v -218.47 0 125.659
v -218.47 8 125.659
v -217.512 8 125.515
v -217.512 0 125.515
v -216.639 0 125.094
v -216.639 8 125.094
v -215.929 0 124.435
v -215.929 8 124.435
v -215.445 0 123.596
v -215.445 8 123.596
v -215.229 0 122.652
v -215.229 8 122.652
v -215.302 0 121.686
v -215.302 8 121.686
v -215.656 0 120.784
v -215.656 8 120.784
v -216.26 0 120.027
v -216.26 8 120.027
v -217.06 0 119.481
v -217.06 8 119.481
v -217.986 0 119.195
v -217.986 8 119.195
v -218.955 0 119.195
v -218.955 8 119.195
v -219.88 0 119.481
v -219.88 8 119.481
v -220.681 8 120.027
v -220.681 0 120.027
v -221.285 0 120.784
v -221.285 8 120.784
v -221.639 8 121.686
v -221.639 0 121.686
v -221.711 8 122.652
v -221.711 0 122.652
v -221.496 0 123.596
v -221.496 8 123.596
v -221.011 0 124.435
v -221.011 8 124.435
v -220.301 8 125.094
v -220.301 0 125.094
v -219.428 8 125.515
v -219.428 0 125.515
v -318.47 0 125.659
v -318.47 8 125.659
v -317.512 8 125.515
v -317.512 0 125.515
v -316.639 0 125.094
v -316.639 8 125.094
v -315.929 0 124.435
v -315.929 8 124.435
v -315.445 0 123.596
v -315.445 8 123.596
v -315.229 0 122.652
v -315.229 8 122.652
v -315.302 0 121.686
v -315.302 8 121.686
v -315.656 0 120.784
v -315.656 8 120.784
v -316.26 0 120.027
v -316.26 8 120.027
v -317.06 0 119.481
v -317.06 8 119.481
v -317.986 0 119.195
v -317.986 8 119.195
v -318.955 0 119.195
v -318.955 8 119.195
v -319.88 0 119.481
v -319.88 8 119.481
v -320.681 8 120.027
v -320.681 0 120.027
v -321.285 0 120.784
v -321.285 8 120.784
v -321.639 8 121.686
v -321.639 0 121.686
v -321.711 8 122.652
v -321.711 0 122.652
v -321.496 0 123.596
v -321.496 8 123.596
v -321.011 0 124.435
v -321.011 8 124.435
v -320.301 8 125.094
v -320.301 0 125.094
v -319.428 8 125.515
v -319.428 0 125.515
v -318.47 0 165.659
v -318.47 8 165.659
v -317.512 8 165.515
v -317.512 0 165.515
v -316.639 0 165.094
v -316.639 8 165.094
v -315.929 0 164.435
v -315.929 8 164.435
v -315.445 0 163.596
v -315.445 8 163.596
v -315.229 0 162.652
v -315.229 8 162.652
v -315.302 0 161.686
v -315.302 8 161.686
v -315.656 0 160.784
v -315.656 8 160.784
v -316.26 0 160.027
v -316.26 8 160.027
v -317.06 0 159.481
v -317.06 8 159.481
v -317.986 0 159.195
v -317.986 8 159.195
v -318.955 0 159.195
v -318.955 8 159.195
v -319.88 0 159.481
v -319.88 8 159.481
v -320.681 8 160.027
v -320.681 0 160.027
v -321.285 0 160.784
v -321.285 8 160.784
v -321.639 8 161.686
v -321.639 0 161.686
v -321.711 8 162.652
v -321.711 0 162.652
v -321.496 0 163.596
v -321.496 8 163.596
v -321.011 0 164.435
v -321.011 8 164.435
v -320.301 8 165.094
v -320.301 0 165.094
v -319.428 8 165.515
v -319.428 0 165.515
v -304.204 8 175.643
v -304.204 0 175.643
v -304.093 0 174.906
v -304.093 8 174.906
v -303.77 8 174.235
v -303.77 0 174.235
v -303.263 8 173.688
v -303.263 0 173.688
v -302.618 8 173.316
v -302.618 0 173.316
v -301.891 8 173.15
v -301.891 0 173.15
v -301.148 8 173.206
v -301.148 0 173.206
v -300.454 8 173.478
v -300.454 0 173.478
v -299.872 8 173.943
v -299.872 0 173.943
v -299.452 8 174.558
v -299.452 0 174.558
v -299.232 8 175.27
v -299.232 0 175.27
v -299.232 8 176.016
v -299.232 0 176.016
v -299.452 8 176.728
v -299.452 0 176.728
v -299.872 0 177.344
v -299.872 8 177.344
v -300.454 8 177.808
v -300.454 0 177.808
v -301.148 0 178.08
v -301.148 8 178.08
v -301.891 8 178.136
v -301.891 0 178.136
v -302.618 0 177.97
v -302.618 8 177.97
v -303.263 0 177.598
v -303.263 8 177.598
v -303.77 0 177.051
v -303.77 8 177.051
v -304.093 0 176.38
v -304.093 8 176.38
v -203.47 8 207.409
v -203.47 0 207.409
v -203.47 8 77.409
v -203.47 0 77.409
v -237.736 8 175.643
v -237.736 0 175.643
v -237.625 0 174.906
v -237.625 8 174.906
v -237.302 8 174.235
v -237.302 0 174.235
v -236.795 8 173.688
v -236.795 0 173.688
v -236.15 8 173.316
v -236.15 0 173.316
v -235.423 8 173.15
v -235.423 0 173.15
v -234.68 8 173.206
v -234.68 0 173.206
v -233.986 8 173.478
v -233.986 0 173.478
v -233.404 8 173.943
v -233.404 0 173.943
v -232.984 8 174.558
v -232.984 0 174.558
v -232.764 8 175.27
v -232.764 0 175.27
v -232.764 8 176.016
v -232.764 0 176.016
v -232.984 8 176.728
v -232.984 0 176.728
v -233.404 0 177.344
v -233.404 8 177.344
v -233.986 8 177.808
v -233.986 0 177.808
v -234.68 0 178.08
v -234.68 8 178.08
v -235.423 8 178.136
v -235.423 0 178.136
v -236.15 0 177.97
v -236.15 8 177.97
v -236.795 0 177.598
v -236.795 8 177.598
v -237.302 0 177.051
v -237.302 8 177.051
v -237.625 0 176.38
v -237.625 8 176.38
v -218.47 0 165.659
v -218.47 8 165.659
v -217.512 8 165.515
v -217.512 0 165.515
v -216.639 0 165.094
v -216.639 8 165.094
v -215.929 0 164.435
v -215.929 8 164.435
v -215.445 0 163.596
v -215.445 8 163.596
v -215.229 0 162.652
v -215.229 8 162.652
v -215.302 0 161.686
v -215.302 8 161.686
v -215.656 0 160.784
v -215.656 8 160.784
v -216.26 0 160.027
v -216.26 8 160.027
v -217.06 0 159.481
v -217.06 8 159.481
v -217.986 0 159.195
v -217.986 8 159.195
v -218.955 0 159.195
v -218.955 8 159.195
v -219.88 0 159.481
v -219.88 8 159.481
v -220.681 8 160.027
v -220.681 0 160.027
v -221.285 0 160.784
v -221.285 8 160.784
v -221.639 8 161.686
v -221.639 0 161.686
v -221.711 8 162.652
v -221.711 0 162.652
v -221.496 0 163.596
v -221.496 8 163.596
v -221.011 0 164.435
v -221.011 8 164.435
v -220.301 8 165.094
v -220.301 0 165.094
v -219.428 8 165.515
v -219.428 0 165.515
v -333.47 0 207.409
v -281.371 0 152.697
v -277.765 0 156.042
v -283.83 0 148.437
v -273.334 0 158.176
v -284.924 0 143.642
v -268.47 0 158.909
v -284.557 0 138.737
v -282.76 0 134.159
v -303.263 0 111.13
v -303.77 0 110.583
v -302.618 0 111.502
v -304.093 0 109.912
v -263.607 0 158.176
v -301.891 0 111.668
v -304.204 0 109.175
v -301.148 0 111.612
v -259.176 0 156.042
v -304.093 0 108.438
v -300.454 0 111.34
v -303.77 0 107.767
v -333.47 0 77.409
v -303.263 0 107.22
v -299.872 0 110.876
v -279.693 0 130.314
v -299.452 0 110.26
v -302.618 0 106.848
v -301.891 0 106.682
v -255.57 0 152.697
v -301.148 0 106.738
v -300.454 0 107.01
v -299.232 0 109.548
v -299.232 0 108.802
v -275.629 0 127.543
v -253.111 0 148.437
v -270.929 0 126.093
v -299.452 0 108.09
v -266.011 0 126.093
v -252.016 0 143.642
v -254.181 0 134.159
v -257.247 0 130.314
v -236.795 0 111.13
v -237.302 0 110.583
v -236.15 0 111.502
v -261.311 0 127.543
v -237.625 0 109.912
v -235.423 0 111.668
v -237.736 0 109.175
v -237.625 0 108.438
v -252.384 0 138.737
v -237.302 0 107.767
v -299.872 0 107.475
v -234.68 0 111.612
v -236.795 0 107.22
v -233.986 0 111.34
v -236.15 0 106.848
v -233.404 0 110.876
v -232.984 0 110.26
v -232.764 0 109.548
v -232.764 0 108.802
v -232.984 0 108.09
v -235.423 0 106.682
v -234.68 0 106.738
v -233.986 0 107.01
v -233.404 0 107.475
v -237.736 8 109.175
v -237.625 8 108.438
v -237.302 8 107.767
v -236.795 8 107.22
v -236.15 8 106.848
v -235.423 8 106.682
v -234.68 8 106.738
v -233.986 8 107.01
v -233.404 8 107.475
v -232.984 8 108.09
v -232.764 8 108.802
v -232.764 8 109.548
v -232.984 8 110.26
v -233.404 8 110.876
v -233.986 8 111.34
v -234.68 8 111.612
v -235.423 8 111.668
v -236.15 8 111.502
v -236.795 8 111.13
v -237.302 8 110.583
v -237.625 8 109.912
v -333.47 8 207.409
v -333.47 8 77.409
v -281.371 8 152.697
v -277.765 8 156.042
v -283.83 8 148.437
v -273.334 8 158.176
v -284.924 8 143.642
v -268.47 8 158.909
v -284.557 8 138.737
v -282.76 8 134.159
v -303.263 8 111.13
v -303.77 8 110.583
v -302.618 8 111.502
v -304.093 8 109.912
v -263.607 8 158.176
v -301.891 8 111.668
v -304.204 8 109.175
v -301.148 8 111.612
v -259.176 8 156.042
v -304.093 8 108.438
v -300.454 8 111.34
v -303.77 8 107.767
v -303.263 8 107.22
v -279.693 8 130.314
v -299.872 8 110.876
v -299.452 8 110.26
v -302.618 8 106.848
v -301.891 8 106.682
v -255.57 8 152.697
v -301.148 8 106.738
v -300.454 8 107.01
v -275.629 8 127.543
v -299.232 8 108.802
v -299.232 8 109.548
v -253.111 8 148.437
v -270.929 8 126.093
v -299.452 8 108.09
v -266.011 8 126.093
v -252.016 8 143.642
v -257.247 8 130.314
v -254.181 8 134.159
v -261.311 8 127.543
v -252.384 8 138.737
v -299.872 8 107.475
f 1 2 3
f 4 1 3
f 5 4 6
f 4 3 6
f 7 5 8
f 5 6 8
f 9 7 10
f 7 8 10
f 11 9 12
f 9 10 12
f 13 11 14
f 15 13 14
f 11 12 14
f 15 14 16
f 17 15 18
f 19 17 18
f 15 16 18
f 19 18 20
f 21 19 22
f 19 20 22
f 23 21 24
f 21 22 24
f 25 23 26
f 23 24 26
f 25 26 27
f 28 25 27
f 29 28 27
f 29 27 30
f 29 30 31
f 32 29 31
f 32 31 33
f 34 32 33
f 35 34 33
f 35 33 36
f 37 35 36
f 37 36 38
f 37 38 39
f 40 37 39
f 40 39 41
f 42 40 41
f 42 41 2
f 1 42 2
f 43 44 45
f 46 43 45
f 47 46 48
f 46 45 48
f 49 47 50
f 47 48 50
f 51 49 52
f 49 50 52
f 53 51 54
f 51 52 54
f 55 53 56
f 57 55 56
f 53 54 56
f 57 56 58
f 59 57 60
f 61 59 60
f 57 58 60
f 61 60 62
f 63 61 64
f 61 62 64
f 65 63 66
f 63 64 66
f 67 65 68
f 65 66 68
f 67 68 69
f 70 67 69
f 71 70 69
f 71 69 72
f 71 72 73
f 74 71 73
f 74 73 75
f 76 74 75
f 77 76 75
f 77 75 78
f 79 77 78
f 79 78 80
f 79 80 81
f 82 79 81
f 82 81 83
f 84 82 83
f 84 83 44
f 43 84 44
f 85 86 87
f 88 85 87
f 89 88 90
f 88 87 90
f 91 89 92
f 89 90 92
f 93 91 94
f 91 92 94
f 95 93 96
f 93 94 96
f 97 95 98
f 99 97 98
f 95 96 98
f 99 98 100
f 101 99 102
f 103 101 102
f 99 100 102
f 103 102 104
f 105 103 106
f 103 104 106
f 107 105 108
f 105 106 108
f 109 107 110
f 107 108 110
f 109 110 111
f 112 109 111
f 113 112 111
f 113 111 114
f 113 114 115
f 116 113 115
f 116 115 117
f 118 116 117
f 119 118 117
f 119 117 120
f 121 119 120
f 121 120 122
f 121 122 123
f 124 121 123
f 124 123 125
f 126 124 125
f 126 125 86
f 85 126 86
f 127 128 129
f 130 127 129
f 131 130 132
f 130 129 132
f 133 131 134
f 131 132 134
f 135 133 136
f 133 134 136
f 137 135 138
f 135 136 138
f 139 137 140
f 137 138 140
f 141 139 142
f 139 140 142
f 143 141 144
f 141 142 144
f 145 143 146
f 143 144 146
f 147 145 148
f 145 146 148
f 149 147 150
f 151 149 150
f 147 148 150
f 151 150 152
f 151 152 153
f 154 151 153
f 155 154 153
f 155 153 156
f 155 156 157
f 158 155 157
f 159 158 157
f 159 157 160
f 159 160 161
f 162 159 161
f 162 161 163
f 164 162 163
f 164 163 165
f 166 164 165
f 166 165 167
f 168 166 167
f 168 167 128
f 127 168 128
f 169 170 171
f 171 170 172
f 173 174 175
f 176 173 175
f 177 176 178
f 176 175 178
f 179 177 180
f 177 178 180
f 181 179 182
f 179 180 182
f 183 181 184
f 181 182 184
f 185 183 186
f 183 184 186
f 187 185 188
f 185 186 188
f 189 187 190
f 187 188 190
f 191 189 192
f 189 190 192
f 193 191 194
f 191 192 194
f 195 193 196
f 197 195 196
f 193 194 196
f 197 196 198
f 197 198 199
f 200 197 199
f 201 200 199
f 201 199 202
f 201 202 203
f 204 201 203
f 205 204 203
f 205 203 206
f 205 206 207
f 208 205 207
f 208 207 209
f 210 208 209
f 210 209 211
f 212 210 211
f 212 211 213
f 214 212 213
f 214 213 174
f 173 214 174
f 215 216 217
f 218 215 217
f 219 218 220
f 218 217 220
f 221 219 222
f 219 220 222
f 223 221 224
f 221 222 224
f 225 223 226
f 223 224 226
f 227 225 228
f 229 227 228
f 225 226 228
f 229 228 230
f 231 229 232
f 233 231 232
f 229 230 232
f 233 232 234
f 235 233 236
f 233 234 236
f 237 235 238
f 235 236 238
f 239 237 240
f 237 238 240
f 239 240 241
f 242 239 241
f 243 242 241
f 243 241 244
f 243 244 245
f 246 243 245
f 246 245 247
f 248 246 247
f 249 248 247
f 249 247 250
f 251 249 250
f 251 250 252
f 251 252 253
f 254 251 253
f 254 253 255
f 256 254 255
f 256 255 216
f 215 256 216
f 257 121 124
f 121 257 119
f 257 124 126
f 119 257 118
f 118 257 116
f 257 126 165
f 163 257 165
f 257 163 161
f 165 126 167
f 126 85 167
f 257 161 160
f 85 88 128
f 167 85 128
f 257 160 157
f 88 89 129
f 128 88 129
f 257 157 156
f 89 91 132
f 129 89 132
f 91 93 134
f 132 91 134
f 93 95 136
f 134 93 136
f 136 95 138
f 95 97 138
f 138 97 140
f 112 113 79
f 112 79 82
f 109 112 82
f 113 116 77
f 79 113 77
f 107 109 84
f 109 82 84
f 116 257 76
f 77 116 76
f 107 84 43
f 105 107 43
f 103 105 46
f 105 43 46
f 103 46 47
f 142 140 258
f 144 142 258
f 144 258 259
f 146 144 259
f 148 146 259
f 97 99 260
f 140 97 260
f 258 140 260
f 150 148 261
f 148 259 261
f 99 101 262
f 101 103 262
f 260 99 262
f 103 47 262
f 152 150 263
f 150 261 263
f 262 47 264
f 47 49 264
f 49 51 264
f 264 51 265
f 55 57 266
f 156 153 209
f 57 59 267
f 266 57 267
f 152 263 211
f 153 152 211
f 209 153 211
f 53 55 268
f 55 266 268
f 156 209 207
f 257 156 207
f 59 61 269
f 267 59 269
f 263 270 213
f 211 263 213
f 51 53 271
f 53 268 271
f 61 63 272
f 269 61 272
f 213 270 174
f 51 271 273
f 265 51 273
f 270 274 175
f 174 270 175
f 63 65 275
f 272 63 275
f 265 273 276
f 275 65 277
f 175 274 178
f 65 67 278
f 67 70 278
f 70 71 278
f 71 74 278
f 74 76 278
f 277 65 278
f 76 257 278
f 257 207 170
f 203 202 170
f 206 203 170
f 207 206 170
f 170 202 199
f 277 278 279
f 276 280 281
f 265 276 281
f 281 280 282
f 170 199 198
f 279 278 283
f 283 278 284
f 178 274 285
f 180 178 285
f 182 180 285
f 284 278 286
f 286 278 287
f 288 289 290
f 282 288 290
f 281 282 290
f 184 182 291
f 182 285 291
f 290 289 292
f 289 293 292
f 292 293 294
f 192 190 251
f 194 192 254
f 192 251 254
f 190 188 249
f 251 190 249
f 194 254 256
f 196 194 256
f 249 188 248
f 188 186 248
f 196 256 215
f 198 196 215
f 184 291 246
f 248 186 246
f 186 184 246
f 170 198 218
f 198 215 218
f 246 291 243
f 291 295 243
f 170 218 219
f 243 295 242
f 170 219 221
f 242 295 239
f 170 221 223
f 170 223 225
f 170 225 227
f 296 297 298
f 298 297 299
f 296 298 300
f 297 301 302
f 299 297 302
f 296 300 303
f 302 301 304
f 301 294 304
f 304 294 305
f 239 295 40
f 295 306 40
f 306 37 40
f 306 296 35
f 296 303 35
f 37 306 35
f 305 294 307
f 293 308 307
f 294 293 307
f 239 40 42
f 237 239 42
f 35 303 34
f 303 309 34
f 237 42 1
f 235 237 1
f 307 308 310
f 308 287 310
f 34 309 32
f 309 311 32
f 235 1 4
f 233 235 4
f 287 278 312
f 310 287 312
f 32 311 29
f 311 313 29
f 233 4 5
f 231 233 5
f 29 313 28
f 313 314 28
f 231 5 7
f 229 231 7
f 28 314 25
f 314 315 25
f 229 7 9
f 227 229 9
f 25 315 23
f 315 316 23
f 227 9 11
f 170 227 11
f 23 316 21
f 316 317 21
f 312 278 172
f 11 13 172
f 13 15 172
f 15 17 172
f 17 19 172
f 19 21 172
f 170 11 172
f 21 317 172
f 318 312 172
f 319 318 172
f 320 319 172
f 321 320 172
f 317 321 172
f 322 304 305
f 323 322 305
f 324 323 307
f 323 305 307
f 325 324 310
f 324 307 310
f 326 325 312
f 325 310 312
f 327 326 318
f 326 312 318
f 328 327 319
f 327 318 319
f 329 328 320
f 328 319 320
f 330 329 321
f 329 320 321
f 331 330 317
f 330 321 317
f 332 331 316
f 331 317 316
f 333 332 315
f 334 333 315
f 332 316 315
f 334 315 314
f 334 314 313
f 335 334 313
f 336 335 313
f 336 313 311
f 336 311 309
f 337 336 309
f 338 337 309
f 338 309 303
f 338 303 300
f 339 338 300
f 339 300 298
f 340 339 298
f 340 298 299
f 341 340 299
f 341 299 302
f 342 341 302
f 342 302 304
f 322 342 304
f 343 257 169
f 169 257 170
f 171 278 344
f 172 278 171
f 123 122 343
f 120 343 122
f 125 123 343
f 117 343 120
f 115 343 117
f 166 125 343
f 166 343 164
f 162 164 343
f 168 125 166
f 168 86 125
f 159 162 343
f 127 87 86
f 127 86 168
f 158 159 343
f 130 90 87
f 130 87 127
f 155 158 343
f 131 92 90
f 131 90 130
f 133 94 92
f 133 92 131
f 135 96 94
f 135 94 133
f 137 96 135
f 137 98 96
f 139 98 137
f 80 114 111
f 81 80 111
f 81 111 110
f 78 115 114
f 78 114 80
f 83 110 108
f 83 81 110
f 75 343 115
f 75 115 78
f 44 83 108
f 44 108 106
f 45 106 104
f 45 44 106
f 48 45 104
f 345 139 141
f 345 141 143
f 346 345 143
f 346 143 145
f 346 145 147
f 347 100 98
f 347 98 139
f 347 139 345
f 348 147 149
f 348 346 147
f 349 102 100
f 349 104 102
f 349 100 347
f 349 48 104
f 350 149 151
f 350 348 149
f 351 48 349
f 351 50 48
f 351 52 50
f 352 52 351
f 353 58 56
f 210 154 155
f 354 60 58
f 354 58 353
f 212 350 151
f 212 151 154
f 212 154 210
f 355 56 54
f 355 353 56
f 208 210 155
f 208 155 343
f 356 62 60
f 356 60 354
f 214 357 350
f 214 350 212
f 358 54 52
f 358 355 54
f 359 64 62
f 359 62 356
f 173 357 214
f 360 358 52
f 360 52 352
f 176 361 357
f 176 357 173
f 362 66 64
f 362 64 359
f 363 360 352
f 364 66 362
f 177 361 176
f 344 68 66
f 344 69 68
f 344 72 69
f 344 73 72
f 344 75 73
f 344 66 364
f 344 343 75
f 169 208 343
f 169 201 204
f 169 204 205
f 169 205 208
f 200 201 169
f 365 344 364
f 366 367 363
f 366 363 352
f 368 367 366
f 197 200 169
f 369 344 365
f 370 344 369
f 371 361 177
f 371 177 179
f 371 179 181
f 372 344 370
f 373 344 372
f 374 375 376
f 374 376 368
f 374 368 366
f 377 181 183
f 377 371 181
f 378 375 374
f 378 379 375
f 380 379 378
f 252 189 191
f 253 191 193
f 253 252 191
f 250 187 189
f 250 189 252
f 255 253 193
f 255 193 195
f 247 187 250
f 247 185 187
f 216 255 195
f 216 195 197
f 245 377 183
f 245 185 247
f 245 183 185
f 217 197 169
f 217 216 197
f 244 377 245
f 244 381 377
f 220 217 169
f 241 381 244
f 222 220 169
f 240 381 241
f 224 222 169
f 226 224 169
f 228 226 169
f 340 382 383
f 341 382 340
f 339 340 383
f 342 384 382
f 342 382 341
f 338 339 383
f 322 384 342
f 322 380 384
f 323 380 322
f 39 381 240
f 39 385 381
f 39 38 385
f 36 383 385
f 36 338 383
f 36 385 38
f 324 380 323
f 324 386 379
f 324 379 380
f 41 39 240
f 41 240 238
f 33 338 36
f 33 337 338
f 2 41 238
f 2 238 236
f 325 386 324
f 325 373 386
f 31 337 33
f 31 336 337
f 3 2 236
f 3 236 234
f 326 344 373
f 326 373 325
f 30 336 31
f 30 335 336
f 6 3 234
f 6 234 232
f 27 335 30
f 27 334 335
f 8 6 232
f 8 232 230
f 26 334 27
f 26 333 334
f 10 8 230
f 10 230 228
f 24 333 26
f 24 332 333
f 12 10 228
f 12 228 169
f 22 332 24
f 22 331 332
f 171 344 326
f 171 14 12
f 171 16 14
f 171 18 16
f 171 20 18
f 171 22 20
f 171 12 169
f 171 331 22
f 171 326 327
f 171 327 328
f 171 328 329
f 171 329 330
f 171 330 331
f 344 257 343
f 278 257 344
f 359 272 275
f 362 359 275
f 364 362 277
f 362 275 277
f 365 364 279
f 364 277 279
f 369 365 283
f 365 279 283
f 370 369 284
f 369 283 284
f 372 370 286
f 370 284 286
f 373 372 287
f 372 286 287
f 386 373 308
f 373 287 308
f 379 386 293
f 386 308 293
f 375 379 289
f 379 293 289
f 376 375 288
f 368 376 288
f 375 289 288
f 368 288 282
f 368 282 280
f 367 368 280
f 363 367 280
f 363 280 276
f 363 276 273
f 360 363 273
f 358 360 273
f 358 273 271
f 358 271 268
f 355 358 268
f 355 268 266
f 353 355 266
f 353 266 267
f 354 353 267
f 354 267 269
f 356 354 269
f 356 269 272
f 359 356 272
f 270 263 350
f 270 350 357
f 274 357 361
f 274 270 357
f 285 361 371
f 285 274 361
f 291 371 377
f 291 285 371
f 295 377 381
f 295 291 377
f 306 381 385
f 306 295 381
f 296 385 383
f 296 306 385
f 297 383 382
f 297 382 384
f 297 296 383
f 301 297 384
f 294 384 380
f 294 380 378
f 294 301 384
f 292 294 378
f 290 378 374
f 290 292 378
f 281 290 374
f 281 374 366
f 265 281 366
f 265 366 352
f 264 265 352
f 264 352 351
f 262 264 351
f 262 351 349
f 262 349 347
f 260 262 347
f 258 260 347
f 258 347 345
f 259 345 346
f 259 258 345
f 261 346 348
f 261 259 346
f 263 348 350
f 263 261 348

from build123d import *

# Parameters (mm, degrees)
SKETCH1_W             = 130
SKETCH1_H             = 130
SKETCH1_R             = 16.5
BOSS_EXTRUDE1_DEPTH   = 8
SKETCH2_R             = 3.25
CUT_EXTRUDE1_DEPTH    = 393.791233964
M6X1_0_TAPPED_HOLE2_D = 5


with BuildPart() as part:
    # Sketch1 → Boss-Extrude1 (new body)
    with BuildSketch(Plane(origin=(0, 0, 0), x_dir=(1, 0, 0), z_dir=(0, 1, 0))):
        with Locations((-268.470286077, -142.40906871)):
            Rectangle(SKETCH1_W, SKETCH1_H)
        with Locations(Location((-268.470286077, -142.40906871, 0), (0, 0, 270))):
            Circle(SKETCH1_R, mode=Mode.SUBTRACT)
    extrude(amount=BOSS_EXTRUDE1_DEPTH)

    # Sketch2 → Cut-Extrude1 (cut, through all)
    with BuildSketch(Plane(origin=(0, 8, 0), x_dir=(1, 0, 0), z_dir=(0, 1, 0))):
        with Locations(Location((-318.470286077, -162.40906871, 0), (0, 0, 270))):
            Circle(SKETCH2_R)
        with Locations(Location((-318.470286077, -122.40906871, 0), (0, 0, 270))):
            Circle(SKETCH2_R)
        with Locations(Location((-218.470286077, -122.40906871, 0), (0, 0, 270))):
            Circle(SKETCH2_R)
        with Locations(Location((-218.470286077, -162.40906871, 0), (0, 0, 270))):
            Circle(SKETCH2_R)
    extrude(amount=-CUT_EXTRUDE1_DEPTH, mode=Mode.SUBTRACT)

    # M6x1.0 Tapped Hole2 (through all)
    with Locations(Plane(origin=(0, 8, 0), x_dir=(1, 0, 0), z_dir=(0, 1, 0))):
        with Locations((-301.704286077, -109.17506871), (-235.236286077, -109.17506871), (-235.236286077, -175.64306871), (-301.704286077, -175.64306871)):
            Hole(M6X1_0_TAPPED_HOLE2_D / 2)


solid = part.part
